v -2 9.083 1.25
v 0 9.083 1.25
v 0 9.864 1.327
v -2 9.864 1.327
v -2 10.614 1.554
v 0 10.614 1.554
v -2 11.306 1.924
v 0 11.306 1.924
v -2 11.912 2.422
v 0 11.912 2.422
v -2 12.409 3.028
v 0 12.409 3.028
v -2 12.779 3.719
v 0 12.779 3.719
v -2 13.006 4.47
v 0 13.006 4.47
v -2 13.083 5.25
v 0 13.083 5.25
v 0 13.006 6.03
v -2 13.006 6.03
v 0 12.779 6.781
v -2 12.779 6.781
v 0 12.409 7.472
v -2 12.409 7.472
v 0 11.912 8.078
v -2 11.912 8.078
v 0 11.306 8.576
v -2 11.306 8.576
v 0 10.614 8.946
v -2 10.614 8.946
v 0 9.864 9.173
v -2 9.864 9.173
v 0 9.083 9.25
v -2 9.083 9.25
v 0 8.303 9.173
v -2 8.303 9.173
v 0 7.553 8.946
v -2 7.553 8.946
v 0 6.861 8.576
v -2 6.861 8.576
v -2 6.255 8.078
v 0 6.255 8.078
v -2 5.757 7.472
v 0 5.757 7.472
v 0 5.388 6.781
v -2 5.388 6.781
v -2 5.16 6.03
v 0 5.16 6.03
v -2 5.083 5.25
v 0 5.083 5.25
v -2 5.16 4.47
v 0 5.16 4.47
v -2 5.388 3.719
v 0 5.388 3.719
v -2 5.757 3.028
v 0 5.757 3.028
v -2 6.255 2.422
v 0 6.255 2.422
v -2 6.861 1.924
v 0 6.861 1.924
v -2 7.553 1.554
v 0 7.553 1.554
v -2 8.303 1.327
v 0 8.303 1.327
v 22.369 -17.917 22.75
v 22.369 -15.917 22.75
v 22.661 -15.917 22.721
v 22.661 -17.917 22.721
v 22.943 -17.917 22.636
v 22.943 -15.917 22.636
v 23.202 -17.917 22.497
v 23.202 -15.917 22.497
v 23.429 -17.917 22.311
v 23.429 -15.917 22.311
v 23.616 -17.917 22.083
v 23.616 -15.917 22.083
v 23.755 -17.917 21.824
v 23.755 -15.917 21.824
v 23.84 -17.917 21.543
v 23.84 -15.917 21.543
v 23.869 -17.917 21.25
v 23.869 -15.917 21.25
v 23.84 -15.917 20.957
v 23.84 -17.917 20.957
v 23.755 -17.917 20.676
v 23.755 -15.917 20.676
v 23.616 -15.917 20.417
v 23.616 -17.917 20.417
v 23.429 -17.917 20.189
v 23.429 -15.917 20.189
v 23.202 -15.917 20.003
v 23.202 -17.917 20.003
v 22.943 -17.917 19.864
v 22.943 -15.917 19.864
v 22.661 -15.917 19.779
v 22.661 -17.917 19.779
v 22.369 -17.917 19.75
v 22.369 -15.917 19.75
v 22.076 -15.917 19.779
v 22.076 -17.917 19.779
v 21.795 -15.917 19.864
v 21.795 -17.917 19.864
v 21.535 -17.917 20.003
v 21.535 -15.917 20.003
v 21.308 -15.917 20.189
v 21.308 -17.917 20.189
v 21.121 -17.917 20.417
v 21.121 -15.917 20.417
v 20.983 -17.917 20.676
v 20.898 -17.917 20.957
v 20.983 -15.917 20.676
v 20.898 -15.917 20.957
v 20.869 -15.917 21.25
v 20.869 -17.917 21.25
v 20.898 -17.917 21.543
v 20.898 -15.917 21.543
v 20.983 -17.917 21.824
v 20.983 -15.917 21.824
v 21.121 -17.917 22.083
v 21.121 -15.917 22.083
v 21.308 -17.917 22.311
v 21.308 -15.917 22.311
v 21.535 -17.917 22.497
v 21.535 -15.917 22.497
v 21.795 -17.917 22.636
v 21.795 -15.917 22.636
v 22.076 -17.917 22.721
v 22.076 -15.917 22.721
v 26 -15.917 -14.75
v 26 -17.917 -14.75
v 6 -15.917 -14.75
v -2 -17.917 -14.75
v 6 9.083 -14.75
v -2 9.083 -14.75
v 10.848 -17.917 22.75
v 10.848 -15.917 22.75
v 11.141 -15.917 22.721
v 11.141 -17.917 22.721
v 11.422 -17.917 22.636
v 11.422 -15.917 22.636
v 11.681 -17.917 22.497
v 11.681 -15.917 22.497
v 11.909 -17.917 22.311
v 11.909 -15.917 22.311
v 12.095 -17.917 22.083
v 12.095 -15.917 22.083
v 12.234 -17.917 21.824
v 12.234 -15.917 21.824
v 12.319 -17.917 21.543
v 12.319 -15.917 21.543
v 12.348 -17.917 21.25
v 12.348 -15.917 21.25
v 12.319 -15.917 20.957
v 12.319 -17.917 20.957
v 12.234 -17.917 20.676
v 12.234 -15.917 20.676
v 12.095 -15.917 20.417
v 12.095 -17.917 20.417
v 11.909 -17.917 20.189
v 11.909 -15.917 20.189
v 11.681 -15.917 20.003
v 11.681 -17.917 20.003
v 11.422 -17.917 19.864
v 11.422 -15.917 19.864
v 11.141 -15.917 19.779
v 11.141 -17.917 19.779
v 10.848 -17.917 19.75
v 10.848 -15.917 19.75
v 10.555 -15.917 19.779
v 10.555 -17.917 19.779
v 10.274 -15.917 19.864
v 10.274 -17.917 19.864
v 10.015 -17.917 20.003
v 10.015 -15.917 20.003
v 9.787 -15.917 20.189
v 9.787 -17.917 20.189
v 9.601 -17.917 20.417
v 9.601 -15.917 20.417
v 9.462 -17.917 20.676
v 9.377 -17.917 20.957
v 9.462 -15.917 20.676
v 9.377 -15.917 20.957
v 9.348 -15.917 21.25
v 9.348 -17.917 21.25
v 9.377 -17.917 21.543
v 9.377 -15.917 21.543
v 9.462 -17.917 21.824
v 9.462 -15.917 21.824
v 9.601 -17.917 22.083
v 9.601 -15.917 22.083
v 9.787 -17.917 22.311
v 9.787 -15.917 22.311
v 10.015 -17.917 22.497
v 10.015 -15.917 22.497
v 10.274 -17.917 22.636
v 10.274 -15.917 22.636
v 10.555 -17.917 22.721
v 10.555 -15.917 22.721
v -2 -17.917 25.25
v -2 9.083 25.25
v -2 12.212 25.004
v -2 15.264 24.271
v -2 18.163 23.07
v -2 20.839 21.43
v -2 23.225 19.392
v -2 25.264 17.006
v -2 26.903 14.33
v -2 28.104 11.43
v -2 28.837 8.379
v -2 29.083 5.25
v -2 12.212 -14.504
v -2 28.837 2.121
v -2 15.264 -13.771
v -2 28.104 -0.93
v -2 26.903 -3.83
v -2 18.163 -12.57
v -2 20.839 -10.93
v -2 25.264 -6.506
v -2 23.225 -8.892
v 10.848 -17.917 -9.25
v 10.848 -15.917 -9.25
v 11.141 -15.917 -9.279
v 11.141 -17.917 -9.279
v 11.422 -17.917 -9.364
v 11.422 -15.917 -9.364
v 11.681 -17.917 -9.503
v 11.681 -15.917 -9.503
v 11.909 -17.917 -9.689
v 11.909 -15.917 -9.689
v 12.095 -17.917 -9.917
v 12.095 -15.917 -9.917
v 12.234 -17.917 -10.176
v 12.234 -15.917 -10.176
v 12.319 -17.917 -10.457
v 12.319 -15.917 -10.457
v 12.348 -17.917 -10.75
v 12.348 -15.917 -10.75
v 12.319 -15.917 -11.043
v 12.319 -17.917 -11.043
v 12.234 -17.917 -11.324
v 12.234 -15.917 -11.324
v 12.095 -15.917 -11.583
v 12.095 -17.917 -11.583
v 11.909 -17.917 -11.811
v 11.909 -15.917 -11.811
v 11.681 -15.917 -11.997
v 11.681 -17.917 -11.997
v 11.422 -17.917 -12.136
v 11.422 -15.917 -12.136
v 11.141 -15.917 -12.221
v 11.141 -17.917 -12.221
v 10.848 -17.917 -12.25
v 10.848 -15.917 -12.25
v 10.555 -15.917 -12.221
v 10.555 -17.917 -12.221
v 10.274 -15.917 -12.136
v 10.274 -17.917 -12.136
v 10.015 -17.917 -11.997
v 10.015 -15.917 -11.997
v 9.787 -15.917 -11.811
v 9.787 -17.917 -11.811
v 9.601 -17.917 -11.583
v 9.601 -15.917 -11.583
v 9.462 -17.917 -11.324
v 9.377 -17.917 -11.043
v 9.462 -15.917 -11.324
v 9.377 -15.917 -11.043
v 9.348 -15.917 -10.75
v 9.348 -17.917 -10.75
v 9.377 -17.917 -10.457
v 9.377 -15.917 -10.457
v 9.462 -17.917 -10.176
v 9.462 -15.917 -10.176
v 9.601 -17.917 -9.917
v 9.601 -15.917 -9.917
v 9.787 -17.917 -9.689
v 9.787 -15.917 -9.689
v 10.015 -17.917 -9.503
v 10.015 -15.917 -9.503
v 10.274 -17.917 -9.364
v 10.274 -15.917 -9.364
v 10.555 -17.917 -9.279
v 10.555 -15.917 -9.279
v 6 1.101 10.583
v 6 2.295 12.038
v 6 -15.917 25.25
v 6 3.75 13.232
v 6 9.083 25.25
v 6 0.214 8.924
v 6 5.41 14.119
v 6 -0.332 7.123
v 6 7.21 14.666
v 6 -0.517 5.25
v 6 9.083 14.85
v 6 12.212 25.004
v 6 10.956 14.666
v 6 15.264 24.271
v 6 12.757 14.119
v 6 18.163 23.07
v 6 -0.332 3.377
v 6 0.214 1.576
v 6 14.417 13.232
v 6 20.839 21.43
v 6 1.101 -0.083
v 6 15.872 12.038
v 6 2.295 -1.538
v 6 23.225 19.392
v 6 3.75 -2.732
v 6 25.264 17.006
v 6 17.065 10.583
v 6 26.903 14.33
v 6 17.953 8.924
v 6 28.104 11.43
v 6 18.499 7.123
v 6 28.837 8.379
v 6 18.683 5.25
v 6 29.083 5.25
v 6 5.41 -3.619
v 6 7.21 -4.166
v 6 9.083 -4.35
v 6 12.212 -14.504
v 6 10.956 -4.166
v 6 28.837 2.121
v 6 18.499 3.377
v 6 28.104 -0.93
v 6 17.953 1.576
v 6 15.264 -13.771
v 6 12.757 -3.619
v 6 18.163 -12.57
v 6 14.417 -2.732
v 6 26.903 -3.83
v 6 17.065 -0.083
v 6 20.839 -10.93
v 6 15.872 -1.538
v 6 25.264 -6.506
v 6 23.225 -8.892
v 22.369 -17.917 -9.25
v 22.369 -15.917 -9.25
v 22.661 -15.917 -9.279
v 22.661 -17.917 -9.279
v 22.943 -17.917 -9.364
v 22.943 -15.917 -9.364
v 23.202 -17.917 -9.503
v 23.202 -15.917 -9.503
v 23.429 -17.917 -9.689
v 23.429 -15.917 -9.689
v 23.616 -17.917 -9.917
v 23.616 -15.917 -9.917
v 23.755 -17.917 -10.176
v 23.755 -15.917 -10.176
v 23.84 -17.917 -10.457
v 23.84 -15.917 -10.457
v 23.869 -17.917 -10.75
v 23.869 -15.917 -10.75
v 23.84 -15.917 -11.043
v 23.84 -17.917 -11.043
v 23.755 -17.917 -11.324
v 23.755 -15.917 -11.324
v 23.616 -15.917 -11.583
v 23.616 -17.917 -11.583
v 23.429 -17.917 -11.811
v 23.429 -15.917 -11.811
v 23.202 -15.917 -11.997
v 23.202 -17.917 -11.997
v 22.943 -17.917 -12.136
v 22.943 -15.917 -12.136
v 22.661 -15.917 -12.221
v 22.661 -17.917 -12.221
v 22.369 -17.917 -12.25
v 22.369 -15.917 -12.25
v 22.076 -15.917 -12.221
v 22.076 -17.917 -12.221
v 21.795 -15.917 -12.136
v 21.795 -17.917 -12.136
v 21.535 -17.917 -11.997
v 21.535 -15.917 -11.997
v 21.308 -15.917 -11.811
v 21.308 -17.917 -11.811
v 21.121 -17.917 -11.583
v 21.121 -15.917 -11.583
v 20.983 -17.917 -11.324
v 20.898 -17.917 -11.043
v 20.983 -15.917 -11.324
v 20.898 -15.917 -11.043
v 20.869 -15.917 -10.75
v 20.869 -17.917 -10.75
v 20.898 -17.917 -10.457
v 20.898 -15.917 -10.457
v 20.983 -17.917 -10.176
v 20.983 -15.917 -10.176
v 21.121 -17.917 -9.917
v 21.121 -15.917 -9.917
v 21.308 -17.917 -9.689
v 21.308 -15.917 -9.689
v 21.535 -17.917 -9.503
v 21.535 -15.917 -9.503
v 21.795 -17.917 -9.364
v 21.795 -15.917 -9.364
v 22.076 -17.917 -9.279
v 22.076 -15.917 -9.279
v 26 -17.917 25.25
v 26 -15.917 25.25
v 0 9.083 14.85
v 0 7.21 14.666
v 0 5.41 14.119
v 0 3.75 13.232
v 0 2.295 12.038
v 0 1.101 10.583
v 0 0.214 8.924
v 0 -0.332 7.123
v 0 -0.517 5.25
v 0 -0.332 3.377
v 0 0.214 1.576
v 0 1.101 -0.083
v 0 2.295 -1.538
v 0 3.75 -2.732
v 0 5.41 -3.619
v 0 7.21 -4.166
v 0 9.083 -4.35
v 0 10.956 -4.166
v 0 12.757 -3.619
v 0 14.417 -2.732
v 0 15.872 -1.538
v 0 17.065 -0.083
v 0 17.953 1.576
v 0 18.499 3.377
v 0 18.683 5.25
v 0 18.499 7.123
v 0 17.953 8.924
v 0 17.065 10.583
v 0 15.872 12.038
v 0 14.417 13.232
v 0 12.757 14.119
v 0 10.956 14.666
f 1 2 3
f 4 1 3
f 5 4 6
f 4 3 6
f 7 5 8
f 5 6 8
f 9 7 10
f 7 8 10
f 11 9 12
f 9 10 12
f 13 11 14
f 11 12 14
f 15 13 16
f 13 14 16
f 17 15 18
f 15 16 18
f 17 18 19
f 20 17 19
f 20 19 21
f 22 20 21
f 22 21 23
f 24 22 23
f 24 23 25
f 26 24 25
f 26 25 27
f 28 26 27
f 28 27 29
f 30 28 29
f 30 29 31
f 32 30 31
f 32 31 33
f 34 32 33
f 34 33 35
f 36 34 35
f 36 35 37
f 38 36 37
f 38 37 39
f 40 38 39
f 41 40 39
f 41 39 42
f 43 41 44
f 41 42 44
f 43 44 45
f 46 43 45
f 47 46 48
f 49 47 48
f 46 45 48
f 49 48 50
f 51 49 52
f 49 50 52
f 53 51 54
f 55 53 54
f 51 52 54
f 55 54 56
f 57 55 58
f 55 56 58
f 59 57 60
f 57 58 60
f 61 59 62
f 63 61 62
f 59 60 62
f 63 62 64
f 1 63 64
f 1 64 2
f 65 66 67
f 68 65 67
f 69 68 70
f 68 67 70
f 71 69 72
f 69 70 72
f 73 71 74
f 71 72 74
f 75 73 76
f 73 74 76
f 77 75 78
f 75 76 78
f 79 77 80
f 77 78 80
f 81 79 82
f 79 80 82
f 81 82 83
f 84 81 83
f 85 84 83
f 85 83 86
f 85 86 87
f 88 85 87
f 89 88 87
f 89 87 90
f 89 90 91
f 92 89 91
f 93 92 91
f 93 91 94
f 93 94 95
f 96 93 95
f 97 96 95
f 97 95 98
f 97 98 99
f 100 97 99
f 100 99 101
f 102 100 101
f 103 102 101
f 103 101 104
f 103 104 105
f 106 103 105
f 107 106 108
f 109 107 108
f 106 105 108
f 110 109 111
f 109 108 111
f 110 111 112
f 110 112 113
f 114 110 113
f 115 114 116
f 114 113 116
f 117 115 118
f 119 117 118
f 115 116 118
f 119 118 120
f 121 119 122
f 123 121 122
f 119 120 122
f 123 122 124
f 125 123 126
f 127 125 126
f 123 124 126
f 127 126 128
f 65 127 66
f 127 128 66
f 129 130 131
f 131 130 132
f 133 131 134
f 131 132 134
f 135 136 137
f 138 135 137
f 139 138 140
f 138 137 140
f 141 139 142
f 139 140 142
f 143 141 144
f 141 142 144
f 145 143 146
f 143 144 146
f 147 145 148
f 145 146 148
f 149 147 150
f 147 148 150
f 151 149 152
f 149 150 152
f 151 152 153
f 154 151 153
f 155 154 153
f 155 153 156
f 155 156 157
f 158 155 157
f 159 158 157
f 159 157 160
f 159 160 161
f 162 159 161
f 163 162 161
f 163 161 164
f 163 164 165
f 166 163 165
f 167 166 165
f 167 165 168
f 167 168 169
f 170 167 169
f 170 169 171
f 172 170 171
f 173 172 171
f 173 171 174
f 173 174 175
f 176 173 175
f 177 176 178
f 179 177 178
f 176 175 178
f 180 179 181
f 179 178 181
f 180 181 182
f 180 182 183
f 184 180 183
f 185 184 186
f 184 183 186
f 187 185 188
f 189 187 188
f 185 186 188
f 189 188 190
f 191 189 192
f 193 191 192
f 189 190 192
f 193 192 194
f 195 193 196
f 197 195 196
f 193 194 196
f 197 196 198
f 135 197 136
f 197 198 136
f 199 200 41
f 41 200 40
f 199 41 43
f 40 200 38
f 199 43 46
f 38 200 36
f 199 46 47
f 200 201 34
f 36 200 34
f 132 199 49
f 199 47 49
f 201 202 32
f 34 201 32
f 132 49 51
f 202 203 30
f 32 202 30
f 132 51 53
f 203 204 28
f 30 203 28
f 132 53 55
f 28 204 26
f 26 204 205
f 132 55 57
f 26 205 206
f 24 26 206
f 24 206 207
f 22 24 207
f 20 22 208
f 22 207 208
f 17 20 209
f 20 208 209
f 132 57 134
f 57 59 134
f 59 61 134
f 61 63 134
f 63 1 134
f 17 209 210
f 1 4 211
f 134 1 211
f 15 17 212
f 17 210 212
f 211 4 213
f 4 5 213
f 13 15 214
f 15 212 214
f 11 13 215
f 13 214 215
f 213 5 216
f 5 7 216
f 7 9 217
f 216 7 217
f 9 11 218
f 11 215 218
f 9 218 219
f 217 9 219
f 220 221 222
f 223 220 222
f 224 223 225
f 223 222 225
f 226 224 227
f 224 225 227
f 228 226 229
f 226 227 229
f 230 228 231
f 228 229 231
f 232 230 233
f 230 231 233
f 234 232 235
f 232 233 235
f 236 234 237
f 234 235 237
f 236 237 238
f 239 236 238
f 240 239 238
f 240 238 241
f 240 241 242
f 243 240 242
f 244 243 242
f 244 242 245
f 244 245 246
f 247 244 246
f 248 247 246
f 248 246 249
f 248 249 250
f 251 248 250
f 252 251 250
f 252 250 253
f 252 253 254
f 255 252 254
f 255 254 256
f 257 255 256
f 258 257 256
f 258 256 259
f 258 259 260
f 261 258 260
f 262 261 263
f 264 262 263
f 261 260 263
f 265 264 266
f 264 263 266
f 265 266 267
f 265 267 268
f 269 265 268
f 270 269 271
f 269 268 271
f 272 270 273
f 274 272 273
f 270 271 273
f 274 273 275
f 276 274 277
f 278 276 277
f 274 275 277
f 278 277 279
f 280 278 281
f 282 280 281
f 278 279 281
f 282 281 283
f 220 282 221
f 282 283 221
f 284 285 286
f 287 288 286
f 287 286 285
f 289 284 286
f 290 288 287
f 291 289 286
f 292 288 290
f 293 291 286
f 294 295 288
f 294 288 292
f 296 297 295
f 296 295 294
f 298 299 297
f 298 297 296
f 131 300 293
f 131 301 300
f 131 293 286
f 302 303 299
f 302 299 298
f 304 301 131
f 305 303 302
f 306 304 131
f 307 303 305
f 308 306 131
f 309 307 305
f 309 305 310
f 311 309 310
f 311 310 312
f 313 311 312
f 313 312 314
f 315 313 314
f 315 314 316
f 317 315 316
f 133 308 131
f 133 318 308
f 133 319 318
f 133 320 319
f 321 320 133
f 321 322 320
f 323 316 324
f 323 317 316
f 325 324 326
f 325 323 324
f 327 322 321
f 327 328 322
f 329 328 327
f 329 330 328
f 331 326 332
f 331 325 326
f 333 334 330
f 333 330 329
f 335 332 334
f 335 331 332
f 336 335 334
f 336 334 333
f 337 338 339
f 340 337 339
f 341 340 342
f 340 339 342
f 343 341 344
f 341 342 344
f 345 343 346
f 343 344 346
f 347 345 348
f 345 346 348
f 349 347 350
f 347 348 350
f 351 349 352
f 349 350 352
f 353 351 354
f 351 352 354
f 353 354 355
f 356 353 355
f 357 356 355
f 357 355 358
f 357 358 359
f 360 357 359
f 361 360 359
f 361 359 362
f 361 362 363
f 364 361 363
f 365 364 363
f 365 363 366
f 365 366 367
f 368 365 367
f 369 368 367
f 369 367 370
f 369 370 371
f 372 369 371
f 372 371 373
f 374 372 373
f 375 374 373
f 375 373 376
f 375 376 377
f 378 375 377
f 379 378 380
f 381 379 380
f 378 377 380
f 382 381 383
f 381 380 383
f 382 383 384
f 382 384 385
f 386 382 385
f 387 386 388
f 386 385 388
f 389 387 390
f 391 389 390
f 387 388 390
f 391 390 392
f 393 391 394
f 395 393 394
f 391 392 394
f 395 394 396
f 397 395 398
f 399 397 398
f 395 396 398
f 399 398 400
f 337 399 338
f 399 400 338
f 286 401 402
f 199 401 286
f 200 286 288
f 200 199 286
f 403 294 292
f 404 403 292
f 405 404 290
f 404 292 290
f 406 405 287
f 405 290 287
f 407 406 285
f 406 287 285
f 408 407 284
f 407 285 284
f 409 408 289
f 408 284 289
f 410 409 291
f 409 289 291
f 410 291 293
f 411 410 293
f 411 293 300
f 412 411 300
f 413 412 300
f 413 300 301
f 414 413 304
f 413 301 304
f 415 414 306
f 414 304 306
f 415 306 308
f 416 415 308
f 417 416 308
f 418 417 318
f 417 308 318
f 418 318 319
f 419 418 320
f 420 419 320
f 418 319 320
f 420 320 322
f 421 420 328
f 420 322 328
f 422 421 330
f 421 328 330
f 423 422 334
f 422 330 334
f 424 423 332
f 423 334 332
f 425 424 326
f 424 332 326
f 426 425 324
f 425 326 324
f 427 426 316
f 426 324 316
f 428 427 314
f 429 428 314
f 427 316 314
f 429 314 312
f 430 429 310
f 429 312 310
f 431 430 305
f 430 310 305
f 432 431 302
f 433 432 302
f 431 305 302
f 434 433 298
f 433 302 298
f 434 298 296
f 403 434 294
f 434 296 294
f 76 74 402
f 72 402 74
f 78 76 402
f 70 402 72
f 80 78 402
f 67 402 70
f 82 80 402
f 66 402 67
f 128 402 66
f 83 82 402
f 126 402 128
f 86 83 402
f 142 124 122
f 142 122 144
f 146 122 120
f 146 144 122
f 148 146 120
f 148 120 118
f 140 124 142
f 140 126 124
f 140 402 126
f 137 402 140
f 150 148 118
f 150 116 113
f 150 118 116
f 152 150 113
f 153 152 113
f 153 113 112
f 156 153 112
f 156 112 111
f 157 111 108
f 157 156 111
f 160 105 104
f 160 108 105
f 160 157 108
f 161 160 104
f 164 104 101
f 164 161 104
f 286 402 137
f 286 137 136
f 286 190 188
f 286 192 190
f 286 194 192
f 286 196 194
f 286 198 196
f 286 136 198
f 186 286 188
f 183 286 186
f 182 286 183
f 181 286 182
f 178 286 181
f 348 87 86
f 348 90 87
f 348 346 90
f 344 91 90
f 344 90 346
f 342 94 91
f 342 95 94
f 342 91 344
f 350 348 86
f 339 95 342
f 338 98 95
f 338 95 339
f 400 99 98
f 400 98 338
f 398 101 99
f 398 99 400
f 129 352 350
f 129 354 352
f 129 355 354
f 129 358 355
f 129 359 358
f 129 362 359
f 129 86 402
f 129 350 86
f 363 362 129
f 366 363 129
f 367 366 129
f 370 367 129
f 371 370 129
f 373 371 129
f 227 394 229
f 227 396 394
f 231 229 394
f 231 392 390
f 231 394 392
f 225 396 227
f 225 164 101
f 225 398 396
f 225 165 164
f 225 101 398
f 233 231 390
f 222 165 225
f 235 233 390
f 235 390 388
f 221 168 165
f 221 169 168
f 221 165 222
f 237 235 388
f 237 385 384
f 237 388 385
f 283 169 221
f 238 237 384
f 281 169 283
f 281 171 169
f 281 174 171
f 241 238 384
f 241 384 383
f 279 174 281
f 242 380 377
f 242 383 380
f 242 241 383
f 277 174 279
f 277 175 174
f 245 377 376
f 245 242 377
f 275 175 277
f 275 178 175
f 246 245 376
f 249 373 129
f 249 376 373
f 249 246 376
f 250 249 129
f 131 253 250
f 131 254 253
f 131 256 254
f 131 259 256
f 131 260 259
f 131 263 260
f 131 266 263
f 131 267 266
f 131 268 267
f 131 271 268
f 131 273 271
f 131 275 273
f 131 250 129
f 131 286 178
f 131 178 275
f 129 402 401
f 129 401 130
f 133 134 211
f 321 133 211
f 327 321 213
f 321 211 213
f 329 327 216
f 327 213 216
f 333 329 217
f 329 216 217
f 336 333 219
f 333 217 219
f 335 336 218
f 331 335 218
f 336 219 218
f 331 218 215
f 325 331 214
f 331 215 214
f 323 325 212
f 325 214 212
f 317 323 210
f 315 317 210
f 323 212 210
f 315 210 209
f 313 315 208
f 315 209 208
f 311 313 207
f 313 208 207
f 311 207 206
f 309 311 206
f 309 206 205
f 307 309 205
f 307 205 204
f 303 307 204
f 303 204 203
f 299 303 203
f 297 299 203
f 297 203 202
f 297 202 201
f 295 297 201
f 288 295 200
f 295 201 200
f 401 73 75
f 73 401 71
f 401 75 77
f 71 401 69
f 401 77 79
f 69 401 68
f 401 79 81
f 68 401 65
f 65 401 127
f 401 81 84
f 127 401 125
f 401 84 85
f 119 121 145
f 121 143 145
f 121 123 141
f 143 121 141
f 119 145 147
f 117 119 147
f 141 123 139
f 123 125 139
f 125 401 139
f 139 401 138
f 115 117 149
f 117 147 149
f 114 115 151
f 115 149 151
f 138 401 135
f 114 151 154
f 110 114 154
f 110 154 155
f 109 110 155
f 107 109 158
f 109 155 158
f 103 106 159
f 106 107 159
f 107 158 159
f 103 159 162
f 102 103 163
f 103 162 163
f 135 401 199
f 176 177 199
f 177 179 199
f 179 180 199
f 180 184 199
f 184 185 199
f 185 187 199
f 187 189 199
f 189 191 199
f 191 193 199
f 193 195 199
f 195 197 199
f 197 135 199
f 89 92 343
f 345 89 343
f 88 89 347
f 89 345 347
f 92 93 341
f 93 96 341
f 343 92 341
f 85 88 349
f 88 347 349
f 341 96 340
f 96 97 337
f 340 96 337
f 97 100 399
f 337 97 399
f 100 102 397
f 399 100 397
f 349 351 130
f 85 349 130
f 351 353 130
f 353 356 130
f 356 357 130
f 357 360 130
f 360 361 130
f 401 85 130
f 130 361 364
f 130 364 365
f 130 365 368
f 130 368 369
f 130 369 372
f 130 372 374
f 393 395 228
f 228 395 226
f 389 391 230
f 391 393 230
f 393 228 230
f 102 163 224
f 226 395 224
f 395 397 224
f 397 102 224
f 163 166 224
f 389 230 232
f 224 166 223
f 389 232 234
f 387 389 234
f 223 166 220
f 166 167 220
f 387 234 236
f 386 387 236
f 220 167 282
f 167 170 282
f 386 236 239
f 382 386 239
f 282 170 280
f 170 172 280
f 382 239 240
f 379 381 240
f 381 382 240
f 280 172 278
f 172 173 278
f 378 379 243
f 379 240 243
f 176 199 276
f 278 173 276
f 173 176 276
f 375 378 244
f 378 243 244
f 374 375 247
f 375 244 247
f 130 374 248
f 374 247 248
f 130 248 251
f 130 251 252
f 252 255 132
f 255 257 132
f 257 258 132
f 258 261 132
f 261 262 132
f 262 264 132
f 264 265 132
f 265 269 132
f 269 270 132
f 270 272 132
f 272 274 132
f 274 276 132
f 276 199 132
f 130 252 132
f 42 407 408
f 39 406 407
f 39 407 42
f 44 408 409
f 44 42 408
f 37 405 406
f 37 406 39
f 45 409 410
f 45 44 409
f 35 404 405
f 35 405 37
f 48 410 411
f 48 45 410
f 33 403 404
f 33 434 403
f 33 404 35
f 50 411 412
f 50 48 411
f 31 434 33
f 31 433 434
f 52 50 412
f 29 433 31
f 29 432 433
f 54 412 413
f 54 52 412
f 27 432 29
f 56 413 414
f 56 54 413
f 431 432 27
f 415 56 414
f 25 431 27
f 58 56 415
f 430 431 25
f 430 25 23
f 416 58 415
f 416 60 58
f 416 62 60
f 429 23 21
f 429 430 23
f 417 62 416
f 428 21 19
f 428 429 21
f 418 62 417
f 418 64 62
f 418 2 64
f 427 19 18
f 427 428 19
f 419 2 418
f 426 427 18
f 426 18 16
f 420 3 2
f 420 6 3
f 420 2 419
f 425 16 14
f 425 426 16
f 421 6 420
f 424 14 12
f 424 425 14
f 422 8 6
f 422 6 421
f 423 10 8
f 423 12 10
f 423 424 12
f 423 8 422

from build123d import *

# Parameters (mm, degrees)
BOSS_EXTRUDE1_DEPTH      = 6
BOSS_EXTRUDE1_DEPTH_BACK = 2
CUT_EXTRUDE1_DEPTH       = 6
SKETCH3_R                = 4
CUT_EXTRUDE2_DEPTH       = 10
SKETCH4_W                = 40
SKETCH4_H                = 2
BOSS_EXTRUDE2_DEPTH      = 20
SKETCH5_R                = 1.5
CUT_EXTRUDE3_DEPTH       = 10


with BuildPart() as part:
    # Sketch1 → Boss-Extrude1 (new, two sides: drawn at the far end of the back side and taken through both)
    with BuildSketch(Plane(origin=(0, 0, 0), x_dir=(0, 0, -1), z_dir=(1, 0, 0)).offset(-BOSS_EXTRUDE1_DEPTH_BACK)):
        with BuildLine():
            Line((-25.25, 9.083333333), (-25.25, -17.916666667))
            Line((-25.25, -17.916666667), (14.75, -17.916666667))
            Line((14.75, -17.916666667), (14.75, 9.083333333))
            ThreePointArc((14.75, 9.083333333), (-5.25, 29.083333333), (-25.25, 9.083333333))
        make_face()
    extrude(amount=BOSS_EXTRUDE1_DEPTH + BOSS_EXTRUDE1_DEPTH_BACK)

    # Sketch2 → Cut-Extrude1 (cut)
    with BuildSketch(Plane(origin=(6, 0, 0), x_dir=(0, 0, -1), z_dir=(1, 0, 0))):
        with BuildLine():
            ThreePointArc((4.35, 9.083333333), (-5.25, 18.683333333), (-14.85, 9.083333333))
            Line((-14.85, 9.083333333), (4.35, 9.083333333))
        make_face()
        with BuildLine():
            Line((4.35, 9.083333333), (-14.85, 9.083333333))
            ThreePointArc((-14.85, 9.083333333), (-5.25, -0.516666667), (4.35, 9.083333333))
        make_face()
    extrude(amount=-CUT_EXTRUDE1_DEPTH, mode=Mode.SUBTRACT)

    # Sketch3 → Cut-Extrude2 (cut)
    with BuildSketch(Plane(origin=(6, 0, 0), x_dir=(0, 0, -1), z_dir=(1, 0, 0))):
        with Locations((-5.25, 9.083333333)):
            Circle(SKETCH3_R)
    extrude(amount=-CUT_EXTRUDE2_DEPTH, mode=Mode.SUBTRACT)

    # Sketch4 → Boss-Extrude2 (add)
    with BuildSketch(Plane(origin=(6, 0, 0), x_dir=(0, 0, -1), z_dir=(1, 0, 0))):
        with Locations((-5.25, -16.916666667)):
            Rectangle(SKETCH4_W, SKETCH4_H)
    extrude(amount=BOSS_EXTRUDE2_DEPTH)

    # Sketch5 → Cut-Extrude3 (cut)
    with BuildSketch(Plane(origin=(0, -15.916666667, 0), x_dir=(1, 0, 0), z_dir=(0, 1, 0))):
        with Locations(Location((10.84792286, 10.75, 0), (0, 0, 270))):
            Circle(SKETCH5_R)
        with Locations(Location((22.368694263, 10.75, 0), (0, 0, 270))):
            Circle(SKETCH5_R)
        with Locations(Location((10.84792286, -21.25, 0), (0, 0, 270))):
            Circle(SKETCH5_R)
        with Locations(Location((22.368694263, -21.25, 0), (0, 0, 270))):
            Circle(SKETCH5_R)
    extrude(amount=-CUT_EXTRUDE3_DEPTH, mode=Mode.SUBTRACT)


solid = part.part
